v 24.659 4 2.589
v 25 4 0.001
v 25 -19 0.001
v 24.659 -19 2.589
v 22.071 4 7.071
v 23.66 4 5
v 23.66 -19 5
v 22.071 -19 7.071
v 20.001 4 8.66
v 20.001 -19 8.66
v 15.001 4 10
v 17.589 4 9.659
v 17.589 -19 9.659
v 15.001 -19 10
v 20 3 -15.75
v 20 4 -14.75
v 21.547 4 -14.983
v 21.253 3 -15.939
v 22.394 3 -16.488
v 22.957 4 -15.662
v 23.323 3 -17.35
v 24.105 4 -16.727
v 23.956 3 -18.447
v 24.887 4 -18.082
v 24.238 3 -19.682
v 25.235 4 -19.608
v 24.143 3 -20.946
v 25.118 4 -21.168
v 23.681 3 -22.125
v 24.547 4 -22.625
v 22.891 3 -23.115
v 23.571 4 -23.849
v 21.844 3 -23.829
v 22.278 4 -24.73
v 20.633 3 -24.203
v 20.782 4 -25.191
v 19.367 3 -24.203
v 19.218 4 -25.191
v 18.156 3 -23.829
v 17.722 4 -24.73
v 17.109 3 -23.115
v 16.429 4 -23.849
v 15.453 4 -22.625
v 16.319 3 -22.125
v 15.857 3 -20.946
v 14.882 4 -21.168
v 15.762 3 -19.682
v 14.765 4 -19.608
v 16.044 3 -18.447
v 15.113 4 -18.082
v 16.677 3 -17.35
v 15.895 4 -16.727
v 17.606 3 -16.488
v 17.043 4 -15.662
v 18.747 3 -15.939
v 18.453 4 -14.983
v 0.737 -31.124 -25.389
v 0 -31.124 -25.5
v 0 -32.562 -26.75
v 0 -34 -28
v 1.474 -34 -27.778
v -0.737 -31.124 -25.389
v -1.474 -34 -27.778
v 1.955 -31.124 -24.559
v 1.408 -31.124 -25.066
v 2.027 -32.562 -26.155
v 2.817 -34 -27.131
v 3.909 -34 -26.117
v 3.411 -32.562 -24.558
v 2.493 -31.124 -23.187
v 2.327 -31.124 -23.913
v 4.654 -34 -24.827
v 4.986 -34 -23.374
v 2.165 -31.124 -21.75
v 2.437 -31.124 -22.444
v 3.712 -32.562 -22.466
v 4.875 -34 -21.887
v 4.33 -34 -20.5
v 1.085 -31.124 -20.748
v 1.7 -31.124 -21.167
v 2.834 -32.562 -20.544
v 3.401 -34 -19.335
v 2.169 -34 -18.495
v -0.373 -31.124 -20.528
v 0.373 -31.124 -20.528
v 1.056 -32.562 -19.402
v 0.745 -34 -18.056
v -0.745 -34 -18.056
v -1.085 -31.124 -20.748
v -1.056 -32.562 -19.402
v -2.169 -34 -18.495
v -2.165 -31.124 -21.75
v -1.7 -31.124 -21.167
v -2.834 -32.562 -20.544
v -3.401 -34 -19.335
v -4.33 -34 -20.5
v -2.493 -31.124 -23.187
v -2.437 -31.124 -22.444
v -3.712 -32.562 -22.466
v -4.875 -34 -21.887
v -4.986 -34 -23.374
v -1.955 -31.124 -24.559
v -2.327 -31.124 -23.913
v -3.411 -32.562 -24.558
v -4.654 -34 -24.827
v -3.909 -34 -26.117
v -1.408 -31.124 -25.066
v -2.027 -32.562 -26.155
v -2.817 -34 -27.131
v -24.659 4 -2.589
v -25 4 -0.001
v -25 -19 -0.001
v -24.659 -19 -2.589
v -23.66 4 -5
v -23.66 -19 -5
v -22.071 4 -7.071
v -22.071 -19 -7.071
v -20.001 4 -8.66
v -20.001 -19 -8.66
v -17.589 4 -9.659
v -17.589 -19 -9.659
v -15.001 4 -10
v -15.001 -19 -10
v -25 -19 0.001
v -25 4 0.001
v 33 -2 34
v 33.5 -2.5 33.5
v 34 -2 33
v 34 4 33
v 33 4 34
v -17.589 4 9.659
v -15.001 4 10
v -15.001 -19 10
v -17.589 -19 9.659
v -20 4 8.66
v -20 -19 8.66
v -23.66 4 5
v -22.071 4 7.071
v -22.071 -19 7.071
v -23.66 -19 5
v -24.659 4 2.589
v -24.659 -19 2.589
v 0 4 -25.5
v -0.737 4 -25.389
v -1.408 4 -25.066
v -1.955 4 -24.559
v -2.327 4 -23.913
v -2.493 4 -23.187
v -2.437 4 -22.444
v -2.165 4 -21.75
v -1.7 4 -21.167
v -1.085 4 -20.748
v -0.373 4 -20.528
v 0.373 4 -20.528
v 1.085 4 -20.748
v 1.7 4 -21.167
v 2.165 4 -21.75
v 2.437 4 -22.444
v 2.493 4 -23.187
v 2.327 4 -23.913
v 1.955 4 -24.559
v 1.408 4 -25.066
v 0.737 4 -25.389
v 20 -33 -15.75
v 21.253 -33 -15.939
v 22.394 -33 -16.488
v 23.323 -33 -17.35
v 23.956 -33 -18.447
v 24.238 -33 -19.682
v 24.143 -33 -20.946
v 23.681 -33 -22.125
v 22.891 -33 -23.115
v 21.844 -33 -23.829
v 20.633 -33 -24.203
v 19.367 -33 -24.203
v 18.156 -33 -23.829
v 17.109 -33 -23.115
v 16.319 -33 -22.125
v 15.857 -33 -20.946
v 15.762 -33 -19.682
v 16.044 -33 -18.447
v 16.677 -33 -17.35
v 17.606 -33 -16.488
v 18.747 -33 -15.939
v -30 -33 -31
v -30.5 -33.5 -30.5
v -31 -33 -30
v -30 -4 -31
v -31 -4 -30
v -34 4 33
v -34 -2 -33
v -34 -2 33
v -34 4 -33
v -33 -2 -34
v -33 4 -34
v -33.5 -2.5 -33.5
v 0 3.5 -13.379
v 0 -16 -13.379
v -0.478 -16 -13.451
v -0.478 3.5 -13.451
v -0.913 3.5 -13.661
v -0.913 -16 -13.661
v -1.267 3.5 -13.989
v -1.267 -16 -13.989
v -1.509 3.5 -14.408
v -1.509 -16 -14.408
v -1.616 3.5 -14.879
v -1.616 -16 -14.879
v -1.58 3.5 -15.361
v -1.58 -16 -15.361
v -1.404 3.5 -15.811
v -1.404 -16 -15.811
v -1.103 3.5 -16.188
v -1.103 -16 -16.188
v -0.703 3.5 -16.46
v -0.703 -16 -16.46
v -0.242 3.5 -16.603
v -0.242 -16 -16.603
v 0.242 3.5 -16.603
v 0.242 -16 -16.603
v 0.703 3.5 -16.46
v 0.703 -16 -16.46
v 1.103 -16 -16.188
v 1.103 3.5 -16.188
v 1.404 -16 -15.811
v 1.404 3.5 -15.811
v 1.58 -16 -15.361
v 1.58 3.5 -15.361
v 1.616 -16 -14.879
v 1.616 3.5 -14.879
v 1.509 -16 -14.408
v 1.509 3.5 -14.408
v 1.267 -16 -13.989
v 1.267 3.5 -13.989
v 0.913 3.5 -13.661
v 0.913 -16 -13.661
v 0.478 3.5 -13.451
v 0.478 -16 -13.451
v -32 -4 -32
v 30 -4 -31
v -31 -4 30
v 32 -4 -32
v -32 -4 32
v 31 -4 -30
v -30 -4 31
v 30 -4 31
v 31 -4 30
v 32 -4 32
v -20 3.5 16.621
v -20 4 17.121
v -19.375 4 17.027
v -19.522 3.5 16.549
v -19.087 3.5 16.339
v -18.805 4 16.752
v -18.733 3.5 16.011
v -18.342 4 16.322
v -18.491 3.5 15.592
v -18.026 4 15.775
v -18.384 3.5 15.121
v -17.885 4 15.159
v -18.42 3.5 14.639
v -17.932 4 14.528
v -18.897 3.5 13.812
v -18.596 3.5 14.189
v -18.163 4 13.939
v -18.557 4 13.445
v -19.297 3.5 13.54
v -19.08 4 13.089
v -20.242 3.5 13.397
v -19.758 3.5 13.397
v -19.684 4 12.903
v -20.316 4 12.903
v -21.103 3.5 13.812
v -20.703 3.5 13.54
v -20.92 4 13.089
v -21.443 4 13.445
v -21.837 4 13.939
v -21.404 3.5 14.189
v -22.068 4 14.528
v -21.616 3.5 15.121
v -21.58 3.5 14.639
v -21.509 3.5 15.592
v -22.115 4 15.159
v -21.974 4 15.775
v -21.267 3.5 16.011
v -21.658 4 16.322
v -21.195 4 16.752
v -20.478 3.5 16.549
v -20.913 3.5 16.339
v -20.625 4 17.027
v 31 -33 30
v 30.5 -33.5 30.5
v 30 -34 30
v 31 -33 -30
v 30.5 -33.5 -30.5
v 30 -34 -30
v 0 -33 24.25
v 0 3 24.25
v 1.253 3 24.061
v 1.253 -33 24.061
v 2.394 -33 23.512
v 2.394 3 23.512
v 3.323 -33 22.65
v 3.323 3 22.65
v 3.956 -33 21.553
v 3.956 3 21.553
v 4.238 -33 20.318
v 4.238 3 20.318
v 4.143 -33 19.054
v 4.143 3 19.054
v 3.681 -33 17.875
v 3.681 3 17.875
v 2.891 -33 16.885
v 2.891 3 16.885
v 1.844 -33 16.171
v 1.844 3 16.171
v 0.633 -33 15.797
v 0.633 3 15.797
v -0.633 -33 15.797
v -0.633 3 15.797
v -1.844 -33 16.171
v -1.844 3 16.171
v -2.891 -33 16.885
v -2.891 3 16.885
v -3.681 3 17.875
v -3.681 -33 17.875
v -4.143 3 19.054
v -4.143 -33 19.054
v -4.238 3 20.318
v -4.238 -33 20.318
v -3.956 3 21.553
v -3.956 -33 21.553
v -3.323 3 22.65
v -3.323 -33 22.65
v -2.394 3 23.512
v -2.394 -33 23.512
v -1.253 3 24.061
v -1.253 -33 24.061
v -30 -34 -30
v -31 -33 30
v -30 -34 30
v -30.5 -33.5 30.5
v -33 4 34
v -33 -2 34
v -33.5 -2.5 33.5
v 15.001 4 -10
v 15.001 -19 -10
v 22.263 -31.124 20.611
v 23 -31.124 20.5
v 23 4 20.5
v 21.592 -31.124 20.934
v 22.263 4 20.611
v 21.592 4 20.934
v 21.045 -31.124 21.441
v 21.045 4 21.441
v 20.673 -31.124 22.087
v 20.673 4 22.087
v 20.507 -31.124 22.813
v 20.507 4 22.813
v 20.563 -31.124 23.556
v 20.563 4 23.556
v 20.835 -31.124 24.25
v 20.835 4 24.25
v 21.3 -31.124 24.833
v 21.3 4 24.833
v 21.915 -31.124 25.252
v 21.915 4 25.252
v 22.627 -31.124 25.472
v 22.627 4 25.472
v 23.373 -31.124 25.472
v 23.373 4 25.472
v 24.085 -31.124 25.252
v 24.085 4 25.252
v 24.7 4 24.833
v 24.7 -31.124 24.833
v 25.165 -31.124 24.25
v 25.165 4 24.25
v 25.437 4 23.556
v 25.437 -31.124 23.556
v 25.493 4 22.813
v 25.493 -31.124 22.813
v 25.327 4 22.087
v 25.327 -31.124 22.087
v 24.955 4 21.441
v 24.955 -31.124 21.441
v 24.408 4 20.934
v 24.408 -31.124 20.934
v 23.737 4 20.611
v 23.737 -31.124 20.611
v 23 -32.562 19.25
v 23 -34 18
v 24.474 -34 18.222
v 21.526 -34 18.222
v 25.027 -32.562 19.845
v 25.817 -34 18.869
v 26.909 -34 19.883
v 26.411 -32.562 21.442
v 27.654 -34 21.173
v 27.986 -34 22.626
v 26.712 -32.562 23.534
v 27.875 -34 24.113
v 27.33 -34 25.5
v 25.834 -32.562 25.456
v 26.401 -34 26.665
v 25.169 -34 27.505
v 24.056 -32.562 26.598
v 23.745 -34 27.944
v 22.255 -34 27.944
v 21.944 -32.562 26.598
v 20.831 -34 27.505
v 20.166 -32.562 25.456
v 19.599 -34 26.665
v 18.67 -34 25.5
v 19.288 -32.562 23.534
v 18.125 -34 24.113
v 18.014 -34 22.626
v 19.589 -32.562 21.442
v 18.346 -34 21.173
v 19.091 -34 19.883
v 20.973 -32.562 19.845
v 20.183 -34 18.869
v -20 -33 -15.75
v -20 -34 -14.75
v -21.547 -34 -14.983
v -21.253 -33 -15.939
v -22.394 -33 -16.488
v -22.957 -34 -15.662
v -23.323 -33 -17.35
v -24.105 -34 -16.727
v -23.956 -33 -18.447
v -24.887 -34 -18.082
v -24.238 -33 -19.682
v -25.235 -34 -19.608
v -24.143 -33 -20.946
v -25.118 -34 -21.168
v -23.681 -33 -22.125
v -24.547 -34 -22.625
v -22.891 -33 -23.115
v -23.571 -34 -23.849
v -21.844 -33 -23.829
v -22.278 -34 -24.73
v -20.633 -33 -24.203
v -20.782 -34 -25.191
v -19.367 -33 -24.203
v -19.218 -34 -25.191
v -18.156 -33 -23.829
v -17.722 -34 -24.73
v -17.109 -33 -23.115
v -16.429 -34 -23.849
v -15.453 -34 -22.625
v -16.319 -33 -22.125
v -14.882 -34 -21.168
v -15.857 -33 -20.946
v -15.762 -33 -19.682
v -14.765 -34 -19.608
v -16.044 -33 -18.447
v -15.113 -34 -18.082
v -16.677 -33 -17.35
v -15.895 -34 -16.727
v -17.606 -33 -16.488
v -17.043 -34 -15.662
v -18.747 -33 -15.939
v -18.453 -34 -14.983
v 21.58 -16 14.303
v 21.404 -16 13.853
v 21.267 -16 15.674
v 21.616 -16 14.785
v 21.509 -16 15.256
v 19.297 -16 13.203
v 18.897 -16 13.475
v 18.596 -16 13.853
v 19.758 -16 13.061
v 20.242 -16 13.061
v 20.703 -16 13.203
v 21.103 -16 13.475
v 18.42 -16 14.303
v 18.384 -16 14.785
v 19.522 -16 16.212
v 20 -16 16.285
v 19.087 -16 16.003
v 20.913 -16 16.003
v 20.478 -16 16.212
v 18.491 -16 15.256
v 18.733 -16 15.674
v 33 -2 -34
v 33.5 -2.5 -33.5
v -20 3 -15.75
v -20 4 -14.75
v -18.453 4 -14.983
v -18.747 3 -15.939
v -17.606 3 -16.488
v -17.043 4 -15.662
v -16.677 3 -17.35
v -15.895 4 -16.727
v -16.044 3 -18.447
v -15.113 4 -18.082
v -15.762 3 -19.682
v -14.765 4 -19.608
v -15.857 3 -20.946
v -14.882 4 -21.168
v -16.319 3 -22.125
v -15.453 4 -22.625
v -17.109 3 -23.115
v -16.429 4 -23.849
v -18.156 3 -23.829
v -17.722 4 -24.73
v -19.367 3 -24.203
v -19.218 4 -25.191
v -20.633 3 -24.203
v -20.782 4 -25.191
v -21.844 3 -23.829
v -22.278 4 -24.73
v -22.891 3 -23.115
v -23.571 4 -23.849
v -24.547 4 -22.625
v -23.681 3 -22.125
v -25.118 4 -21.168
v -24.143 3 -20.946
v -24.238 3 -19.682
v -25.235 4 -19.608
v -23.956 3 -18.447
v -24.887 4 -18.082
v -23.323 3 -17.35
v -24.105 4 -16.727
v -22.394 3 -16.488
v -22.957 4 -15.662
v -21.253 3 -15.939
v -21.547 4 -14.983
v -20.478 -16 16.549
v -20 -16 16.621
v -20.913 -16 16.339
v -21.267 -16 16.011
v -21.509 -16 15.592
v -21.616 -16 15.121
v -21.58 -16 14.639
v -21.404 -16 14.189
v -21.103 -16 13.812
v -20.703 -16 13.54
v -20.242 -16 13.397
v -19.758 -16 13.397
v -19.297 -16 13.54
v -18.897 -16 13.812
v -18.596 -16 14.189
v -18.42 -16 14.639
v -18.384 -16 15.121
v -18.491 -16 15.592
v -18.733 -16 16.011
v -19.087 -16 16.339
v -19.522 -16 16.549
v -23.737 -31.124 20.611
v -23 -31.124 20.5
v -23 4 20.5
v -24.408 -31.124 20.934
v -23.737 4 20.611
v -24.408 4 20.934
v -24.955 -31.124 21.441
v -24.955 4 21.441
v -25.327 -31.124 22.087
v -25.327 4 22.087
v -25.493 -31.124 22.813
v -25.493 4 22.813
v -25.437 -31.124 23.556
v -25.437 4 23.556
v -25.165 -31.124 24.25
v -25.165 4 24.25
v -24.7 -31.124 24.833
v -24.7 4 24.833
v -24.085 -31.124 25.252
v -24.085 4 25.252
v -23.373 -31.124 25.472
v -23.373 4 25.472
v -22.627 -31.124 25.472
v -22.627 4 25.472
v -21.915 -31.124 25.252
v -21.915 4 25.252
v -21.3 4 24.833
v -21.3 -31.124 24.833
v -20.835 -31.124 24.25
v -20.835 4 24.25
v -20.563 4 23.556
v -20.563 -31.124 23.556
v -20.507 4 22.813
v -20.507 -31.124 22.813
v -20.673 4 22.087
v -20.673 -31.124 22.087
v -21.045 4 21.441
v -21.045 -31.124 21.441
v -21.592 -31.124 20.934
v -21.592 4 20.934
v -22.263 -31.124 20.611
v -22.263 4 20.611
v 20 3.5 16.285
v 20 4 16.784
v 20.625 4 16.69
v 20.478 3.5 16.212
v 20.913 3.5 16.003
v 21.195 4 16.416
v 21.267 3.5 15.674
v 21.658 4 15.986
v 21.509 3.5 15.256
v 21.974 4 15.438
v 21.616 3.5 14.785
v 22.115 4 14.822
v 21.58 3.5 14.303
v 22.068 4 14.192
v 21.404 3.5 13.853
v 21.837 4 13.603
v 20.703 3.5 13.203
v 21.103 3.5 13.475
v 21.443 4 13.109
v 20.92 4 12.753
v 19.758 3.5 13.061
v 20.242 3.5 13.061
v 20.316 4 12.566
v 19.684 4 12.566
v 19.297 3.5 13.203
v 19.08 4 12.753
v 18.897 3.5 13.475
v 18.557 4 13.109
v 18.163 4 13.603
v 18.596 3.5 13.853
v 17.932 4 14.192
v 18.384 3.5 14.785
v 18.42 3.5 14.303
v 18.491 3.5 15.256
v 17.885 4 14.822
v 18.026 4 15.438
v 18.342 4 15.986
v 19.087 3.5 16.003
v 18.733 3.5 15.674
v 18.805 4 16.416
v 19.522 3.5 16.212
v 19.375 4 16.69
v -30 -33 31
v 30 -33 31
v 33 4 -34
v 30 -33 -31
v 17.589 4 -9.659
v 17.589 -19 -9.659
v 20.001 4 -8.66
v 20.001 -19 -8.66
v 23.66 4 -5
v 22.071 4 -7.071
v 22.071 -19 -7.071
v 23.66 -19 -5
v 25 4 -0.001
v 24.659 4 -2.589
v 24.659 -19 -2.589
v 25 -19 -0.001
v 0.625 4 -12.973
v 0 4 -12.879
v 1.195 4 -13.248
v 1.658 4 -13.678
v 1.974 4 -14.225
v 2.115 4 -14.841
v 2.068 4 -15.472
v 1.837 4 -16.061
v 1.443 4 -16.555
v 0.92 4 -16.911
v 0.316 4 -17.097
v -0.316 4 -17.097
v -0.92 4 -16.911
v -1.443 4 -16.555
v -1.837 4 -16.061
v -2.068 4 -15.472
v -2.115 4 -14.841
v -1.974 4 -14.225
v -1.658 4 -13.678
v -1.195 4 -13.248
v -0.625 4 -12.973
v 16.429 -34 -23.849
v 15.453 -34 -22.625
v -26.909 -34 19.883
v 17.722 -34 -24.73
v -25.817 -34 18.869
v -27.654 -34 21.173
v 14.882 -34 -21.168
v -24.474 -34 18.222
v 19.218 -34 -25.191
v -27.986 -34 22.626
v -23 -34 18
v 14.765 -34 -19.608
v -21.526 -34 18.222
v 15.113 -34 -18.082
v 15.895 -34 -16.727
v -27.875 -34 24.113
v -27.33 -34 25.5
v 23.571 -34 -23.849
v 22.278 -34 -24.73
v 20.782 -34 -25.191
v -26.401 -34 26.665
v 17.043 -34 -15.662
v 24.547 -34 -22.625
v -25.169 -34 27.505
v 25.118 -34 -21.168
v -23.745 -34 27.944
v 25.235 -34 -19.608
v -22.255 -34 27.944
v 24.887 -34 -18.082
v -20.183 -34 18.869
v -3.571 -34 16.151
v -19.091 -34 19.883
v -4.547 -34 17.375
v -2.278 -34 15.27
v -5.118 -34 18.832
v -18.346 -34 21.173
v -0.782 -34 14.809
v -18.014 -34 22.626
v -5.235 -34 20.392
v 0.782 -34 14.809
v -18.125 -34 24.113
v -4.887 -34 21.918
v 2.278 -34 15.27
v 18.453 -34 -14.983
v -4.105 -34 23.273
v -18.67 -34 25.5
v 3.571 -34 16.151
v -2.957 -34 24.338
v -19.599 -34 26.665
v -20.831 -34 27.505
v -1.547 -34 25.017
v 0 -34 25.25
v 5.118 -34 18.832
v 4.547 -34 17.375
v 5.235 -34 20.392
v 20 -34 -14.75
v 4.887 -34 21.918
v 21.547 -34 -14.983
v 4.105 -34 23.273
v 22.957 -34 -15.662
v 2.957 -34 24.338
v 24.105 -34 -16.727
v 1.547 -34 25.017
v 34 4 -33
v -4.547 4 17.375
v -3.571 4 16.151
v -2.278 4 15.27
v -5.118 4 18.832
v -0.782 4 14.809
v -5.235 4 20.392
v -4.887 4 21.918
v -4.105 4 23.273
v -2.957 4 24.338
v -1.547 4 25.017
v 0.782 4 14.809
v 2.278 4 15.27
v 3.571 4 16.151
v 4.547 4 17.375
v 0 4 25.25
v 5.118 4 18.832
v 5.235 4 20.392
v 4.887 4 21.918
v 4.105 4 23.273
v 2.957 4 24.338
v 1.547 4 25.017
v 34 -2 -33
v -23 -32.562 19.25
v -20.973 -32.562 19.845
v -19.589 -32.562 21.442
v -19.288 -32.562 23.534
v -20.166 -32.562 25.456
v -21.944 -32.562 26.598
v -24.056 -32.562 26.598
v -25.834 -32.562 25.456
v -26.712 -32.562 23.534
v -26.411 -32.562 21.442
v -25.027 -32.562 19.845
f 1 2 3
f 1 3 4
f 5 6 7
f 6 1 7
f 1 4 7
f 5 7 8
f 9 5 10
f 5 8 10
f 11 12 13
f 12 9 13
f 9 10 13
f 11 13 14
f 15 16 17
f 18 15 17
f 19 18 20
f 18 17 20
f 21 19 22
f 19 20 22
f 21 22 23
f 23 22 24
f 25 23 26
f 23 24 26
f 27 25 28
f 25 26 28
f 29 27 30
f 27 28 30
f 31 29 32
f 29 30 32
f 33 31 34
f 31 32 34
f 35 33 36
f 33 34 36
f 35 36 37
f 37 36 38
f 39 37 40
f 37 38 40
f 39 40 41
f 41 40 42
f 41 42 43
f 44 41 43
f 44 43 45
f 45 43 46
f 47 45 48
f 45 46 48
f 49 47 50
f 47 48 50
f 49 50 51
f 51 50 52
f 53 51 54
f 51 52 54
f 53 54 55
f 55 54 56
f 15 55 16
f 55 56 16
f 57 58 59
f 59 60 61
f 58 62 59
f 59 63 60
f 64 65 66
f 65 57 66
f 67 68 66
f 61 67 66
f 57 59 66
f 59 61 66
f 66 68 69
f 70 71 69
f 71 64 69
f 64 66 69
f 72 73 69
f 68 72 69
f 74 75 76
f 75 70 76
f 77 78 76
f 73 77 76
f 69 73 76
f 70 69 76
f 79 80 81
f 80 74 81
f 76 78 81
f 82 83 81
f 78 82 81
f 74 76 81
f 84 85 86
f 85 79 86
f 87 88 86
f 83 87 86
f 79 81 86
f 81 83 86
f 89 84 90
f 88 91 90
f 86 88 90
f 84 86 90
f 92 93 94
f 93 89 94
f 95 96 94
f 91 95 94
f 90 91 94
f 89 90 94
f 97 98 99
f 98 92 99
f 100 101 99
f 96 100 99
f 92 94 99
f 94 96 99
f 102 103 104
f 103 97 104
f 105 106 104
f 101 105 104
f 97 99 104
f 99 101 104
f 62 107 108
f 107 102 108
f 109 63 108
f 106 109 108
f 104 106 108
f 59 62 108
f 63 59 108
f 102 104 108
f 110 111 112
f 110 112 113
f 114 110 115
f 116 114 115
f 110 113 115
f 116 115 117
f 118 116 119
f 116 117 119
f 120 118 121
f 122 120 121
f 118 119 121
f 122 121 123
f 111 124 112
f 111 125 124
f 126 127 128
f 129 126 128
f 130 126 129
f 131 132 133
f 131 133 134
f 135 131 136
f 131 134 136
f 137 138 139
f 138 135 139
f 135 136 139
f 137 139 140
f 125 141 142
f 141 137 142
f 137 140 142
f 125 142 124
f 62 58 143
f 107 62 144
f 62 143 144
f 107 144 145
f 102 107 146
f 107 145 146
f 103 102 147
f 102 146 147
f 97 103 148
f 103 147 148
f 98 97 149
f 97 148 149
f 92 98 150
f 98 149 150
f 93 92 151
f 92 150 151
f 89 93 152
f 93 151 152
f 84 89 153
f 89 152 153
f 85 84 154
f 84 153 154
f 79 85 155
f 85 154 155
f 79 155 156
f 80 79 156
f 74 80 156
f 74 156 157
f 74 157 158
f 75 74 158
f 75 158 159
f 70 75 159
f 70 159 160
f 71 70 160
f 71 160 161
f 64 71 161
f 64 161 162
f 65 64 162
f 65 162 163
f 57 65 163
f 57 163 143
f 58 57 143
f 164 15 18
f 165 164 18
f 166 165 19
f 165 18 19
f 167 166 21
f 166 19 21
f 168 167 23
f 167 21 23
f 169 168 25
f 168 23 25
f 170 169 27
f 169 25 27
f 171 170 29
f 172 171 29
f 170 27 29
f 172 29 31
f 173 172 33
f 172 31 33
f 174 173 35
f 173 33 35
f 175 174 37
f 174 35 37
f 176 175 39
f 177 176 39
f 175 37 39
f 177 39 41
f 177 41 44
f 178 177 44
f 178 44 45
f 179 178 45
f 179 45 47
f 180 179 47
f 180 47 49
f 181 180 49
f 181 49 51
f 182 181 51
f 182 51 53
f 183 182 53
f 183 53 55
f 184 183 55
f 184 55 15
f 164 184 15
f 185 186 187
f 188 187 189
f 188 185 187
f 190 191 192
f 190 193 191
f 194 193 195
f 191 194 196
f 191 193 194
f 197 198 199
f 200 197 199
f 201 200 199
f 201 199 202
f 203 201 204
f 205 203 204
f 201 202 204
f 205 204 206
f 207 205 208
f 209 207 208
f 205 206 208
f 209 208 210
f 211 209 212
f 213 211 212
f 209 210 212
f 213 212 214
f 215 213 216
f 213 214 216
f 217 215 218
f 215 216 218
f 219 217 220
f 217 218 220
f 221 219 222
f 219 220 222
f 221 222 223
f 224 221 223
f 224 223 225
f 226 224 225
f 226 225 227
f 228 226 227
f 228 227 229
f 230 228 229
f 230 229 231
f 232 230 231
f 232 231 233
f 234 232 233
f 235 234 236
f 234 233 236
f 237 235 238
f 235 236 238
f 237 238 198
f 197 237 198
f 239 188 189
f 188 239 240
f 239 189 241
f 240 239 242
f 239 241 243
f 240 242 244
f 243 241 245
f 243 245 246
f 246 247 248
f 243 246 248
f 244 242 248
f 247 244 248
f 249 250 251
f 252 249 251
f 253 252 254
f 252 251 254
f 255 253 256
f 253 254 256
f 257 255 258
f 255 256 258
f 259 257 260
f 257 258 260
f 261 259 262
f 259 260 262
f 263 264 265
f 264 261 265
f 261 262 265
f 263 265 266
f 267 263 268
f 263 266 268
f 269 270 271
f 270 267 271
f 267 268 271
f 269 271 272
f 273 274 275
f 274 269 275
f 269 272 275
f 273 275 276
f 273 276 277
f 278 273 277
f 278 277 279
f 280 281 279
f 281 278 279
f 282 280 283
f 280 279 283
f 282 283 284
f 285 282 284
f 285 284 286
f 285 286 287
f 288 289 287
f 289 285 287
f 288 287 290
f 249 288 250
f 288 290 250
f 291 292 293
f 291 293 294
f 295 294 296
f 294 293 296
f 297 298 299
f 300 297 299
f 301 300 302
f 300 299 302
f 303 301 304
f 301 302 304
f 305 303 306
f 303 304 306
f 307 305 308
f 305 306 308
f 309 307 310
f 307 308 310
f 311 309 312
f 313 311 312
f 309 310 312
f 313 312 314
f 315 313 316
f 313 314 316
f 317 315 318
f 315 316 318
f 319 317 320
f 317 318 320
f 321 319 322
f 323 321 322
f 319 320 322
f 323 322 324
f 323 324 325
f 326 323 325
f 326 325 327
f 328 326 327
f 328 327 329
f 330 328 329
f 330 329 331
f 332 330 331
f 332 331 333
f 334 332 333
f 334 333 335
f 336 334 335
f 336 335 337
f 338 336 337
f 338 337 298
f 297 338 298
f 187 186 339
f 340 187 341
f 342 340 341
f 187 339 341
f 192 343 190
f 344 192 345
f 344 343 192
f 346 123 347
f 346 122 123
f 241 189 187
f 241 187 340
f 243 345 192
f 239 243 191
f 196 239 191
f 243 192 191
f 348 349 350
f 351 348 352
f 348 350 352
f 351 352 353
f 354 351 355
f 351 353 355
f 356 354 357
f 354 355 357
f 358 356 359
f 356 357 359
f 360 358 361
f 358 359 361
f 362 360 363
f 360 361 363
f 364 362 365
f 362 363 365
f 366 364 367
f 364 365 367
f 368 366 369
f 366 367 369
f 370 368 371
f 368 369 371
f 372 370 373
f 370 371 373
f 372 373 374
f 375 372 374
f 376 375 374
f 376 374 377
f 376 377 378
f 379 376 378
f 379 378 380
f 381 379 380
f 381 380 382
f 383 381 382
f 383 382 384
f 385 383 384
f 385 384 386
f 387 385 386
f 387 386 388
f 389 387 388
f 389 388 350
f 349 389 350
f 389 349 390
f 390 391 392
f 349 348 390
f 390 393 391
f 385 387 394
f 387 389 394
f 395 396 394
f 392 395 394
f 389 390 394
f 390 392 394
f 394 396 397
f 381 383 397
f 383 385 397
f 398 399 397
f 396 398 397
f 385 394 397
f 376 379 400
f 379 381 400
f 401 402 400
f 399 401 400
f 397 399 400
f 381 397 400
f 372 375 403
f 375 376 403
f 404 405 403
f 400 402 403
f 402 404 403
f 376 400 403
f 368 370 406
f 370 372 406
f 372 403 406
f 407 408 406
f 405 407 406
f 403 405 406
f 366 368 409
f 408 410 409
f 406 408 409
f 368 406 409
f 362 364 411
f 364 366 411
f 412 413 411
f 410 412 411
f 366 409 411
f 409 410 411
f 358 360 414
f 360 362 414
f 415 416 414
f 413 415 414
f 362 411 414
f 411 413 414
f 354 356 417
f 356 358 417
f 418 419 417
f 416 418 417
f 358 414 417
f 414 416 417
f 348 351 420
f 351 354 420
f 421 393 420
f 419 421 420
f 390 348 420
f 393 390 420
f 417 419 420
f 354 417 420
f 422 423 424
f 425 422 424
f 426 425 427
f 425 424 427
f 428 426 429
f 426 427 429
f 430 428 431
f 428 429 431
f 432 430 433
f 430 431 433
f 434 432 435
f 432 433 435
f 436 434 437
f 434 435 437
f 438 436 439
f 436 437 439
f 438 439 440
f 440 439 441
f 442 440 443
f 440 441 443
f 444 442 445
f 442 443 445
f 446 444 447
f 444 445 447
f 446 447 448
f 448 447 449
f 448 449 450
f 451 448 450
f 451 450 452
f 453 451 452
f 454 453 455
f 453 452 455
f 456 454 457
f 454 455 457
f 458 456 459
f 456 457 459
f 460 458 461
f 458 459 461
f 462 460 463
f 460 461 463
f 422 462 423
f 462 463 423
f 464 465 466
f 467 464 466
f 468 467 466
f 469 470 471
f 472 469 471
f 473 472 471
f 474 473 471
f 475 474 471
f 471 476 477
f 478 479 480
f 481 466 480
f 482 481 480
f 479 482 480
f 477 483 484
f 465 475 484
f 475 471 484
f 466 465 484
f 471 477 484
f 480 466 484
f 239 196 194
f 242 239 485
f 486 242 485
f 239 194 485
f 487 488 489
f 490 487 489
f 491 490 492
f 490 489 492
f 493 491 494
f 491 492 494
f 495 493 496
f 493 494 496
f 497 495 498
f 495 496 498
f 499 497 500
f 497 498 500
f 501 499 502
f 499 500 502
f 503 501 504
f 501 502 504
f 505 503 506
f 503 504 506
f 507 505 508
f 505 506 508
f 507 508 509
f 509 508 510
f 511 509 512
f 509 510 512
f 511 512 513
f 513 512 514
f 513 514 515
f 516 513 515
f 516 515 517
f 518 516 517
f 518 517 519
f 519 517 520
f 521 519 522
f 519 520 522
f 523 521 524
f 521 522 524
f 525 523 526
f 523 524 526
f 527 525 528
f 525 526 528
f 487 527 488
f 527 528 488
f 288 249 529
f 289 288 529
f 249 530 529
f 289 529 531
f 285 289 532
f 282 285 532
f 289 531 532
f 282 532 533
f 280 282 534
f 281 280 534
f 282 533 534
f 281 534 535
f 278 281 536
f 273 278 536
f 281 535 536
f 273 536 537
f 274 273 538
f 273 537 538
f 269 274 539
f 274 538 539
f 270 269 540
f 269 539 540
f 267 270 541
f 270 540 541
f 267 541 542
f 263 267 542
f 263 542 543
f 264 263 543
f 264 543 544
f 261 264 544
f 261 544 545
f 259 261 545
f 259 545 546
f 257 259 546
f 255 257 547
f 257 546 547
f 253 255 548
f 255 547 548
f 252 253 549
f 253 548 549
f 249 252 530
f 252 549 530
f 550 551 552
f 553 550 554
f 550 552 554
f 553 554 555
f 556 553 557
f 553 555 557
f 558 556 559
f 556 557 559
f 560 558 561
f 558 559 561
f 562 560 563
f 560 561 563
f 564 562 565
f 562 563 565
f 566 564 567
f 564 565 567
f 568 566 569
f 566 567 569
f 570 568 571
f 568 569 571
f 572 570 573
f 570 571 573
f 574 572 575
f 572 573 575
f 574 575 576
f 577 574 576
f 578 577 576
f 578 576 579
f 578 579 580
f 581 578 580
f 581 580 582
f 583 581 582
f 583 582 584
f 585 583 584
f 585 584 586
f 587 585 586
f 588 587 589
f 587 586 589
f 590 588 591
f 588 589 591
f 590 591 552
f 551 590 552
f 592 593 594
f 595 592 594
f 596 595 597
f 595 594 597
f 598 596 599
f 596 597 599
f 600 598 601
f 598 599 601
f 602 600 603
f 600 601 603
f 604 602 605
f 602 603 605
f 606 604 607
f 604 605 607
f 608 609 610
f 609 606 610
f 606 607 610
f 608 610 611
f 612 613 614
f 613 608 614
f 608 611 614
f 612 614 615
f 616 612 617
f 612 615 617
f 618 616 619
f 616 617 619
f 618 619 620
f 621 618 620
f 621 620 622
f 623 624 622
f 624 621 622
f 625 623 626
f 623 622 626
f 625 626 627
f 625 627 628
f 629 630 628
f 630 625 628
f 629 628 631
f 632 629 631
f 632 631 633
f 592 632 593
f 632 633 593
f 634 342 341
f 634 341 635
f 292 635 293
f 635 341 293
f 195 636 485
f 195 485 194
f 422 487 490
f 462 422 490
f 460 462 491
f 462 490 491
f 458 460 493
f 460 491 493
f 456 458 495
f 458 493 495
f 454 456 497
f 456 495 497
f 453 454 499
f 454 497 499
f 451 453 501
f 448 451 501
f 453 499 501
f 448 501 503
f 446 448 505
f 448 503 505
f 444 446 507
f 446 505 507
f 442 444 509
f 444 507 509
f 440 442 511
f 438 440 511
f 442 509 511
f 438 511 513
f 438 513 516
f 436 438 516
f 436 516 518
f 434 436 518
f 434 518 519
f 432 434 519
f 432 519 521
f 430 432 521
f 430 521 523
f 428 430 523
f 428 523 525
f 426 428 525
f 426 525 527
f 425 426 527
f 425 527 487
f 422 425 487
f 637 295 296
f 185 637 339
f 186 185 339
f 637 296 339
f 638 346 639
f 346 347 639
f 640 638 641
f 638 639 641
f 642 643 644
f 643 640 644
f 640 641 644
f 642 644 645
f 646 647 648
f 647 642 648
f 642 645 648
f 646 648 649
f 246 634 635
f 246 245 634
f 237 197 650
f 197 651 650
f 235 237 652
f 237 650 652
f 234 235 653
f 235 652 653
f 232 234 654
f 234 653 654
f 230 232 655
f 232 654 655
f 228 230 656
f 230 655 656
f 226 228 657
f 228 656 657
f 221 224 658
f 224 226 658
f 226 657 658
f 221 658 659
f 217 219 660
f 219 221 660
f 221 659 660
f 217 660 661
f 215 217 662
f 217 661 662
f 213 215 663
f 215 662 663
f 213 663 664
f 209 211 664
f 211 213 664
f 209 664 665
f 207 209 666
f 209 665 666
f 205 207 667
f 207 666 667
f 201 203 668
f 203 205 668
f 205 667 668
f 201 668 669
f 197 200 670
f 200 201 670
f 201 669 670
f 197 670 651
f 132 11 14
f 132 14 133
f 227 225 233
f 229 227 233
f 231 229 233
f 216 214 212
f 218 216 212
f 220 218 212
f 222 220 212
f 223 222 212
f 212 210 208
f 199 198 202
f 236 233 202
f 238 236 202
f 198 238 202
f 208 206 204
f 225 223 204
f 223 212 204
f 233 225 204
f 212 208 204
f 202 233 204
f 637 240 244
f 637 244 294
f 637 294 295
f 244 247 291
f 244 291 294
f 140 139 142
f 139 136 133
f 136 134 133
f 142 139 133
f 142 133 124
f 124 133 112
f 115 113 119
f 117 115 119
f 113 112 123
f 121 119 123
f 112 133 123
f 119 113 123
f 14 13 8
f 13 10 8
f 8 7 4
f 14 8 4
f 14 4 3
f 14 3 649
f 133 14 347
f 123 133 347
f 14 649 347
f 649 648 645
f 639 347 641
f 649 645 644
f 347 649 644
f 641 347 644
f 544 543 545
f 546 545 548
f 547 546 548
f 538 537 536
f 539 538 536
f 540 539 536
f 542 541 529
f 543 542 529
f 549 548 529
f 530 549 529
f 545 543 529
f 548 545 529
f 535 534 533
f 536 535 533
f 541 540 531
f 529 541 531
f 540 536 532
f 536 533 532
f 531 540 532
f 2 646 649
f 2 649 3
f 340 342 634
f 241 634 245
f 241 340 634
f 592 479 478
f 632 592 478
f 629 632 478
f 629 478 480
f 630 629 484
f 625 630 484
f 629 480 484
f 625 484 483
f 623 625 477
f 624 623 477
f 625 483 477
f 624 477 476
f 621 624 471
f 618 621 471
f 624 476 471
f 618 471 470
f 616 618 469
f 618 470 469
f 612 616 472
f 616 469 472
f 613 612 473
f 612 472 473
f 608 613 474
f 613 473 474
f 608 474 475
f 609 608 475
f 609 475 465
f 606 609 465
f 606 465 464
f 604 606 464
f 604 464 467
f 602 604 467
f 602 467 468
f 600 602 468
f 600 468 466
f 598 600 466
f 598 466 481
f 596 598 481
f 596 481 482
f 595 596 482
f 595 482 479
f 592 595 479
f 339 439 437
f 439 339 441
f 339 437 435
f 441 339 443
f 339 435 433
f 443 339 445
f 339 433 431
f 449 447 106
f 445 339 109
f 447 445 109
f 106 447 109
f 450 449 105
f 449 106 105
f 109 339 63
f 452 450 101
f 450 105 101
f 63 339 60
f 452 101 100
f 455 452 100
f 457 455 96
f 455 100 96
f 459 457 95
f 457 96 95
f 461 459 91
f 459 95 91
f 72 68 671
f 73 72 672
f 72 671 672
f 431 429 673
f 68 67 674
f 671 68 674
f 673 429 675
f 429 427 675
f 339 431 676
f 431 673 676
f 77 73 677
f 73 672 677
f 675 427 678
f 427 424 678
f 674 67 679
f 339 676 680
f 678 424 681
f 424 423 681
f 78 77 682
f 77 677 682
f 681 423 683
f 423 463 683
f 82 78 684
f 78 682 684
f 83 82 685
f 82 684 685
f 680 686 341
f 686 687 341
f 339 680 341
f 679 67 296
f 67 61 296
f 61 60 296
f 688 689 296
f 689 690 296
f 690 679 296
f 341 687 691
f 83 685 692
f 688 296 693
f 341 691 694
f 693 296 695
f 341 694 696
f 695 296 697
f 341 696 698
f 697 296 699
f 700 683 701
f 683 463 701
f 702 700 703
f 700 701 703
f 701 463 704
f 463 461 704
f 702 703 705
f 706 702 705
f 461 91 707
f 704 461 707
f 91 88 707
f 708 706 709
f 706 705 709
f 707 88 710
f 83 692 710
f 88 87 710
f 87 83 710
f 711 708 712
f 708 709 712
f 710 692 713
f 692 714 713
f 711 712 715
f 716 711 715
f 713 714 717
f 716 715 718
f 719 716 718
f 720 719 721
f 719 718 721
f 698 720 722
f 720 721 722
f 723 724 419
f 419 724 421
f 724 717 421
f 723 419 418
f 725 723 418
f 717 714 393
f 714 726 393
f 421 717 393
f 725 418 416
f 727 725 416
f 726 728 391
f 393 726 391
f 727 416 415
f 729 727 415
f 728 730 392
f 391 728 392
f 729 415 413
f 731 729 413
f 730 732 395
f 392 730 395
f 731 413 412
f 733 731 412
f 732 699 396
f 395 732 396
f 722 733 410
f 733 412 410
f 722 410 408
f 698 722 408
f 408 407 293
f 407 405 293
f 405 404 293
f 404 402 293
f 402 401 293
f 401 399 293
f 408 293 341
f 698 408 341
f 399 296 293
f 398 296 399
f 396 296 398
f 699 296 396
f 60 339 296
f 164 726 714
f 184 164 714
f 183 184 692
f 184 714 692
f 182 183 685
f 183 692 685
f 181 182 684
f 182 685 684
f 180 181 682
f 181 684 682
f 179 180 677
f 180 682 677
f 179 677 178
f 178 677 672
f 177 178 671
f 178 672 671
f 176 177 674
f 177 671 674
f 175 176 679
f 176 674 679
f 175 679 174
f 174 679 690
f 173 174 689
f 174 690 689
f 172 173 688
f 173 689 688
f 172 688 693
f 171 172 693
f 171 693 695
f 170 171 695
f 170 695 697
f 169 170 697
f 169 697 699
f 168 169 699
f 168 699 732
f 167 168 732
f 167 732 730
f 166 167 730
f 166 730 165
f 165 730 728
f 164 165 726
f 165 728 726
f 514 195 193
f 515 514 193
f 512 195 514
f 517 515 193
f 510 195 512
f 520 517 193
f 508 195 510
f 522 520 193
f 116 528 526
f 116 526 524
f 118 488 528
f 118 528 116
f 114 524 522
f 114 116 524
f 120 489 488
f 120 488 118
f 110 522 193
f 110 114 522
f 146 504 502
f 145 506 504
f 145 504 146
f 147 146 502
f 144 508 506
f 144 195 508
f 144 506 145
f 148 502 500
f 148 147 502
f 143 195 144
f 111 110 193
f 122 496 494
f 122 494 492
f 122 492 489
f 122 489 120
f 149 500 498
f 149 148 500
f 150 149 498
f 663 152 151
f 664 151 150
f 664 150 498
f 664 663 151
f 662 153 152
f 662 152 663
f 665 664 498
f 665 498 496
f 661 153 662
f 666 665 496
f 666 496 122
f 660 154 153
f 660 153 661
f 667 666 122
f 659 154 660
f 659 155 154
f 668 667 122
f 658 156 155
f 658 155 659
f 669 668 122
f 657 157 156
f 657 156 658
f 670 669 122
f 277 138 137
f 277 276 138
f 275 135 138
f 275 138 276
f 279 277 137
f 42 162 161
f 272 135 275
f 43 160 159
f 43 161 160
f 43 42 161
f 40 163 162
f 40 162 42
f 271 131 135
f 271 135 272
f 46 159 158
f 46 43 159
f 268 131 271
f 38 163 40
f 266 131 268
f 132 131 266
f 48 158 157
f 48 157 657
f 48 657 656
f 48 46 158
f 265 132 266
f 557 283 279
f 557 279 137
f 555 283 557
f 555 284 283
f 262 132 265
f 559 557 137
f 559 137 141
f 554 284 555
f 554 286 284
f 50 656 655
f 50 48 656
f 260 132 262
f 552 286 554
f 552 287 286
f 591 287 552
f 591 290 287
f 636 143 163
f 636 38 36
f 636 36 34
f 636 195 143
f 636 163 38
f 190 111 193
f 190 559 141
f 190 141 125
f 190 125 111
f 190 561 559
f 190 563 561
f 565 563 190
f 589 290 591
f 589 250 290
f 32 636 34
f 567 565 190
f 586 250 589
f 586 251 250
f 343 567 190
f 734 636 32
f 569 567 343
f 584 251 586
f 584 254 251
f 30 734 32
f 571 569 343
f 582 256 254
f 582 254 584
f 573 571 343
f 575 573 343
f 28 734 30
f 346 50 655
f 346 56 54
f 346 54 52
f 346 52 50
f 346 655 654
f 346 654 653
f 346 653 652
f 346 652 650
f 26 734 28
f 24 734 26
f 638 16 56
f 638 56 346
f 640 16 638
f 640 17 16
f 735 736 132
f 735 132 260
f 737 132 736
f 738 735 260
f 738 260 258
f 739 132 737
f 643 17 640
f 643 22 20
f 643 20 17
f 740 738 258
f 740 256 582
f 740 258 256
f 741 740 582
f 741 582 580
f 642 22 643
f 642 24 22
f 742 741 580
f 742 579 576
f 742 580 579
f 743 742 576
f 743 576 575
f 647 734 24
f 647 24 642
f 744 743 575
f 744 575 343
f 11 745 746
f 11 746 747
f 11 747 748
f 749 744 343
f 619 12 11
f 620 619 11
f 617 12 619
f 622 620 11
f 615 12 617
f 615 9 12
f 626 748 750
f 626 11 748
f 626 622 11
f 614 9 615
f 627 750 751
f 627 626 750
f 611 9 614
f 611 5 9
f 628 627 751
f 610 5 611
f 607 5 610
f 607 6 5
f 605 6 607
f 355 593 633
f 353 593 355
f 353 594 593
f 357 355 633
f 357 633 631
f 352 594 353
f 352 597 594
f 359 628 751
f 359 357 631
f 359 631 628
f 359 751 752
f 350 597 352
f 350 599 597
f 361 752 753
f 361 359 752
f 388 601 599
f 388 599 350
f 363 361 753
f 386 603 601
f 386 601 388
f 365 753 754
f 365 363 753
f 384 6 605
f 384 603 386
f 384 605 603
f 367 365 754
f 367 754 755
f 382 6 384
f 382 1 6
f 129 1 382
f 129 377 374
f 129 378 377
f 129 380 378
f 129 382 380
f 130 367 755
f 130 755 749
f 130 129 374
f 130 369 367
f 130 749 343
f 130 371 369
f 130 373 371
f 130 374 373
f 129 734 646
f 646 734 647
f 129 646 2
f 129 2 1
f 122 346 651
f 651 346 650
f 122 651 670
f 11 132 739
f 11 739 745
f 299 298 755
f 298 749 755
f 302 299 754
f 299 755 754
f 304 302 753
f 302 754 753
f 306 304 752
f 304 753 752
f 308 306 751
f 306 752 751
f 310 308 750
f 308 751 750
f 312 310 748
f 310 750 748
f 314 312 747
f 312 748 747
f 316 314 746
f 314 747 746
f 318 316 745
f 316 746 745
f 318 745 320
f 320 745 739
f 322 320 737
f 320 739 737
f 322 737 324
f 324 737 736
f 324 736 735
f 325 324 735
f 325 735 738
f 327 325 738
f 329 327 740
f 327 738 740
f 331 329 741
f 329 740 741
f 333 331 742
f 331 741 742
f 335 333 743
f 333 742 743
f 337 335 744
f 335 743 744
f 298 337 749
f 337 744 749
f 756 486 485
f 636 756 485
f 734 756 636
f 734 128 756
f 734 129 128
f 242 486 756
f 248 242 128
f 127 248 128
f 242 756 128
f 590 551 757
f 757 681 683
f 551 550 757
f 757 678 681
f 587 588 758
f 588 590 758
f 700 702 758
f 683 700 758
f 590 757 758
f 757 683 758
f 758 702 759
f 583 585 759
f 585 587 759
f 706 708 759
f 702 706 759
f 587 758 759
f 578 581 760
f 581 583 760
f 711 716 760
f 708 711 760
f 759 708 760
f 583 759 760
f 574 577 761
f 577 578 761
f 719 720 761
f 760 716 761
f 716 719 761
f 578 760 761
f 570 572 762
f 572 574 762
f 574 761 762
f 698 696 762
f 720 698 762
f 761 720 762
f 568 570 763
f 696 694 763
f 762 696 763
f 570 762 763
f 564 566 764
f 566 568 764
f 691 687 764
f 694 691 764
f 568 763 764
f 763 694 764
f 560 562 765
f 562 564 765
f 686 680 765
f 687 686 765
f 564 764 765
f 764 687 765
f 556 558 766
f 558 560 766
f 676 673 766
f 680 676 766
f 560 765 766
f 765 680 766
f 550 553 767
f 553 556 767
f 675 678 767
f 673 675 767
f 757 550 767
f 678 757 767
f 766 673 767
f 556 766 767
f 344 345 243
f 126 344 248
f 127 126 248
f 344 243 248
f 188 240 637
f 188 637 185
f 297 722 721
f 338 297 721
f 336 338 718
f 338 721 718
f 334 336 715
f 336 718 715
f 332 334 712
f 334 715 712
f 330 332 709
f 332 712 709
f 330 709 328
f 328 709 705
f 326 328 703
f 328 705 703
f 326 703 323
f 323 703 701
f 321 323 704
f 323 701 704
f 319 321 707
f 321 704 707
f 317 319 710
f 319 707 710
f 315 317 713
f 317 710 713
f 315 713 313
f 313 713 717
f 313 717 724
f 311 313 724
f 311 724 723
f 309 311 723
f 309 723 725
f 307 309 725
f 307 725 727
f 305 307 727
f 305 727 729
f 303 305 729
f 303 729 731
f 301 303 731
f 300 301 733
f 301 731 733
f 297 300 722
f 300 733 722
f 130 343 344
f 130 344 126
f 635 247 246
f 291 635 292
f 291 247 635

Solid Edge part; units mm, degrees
sketch "Sketch1" plane through (0, 0, 0) normal (0, -1, 0) x (1, 0, 0)
  line L0 (-34, 34) -> (34, 34)
  line L1 (34, 34) -> (34, -34)
  line L2 (34, -34) -> (-34, -34)
  line L3 (-34, -34) -> (-34, 34)
  dimension "D1" = 68
  dimension "D2" = 68
extrude "Protrusion1" add sketch "Sketch1" along normal mid plane 8
sketch "Sketch2" plane through (0, -4, 0) normal (0, -1, 0) x (1, 0, 0)
  line L0 (-31, 31) -> (31, 31)
  line L1 (31, 31) -> (31, -31)
  line L2 (31, -31) -> (-31, -31)
  line L3 (-31, -31) -> (-31, 31)
  dimension "D1" = 62
  dimension "D2" = 62
extrude "Ausprägung_2" add sketch "Sketch2" along normal blind 30
chamfer "Fase_1" distance 2 angle 45 4 edges at (0, -4, -34) (34, -4, 0) (0, -4, 34) (-34, -4, 0)
chamfer "Fase_2" distance 1 angle 45 4 edges at (-31, -34, 0) (0, -34, 31) (31, -34, 0) (0, -34, -31)
chamfer "Fase_3" distance 1 angle 45 8 edges at (31, -18.5, -31) (31, -18.5, 31) (-31, -18.5, 31) (-31, -18.5, -31) (-34, 1, -34) (34, 1, 34) (34, 1, -34) (-34, 1, 34)
hole "Bohrung_1" at (20, 4, -20) direction (0, -1, 0) diameter 8.5 end up to next
hole "Hole1" at (0, 4, 20) direction (0, -1, 0) diameter 8.5 end up to next
hole "Hole2" at (-20, 4, -20) direction (0, -1, 0) diameter 8.5 end up to next
chamfer "Fase_4" distance 1 angle 45 6 edges at (-20, -34, -24.25) (0, -34, 15.75) (20, -34, -24.25) (-24.25, 4, -20) (-4.25, 4, 20) (15.75, 4, -20)
hole "Bohrung_4" at (-20, 4, 15) direction (0, -1, 0) diameter 3.242 depth 20
hole "Hole3" at (20, 4, 14.6635) direction (0, -1, 0) diameter 3.242 depth 20
hole "Hole4" at (0, 4, -15) direction (0, -1, 0) diameter 3.242 depth 20
chamfer "Fase_5" distance 0.5 angle 45 3 edges at (0, 4, -16.621) (-20, 4, 13.379) (20, 4, 13.0425)
hole "Bohrung_11" at (-23, -34, 23) direction (0, 1, 0) diameter 5 depth 38 countersink diameter 10 countersink angle 82
hole "Hole5" at (23, -34, 23) direction (0, 1, 0) diameter 5 depth 38 countersink diameter 10 countersink angle 82
hole "Hole6" at (0, -34, -23) direction (0, 1, 0) diameter 5 depth 38 countersink diameter 10 countersink angle 82
sketch "Sketch3" plane through (0, 4, 0) normal (0, 1, 0) x (1, 0, 0)
  line L0 (-25, 10) -> (25, 10)
  line L1 (25, 10) -> (25, -10)
  line L2 (25, -10) -> (-25, -10)
  line L3 (-25, -10) -> (-25, 10)
  dimension "D1" = 20
  dimension "D2" = 50
extrude "Ausschnitt_1" cut sketch "Sketch3" against normal blind 23
fillet "Verrundung_1" radius 10 4 edges at (-25, -7.5, -10) (-25, -7.5, 10) (25, -7.5, 10) (25, -7.5, -10)
properties material "Aluminium, 1060"
